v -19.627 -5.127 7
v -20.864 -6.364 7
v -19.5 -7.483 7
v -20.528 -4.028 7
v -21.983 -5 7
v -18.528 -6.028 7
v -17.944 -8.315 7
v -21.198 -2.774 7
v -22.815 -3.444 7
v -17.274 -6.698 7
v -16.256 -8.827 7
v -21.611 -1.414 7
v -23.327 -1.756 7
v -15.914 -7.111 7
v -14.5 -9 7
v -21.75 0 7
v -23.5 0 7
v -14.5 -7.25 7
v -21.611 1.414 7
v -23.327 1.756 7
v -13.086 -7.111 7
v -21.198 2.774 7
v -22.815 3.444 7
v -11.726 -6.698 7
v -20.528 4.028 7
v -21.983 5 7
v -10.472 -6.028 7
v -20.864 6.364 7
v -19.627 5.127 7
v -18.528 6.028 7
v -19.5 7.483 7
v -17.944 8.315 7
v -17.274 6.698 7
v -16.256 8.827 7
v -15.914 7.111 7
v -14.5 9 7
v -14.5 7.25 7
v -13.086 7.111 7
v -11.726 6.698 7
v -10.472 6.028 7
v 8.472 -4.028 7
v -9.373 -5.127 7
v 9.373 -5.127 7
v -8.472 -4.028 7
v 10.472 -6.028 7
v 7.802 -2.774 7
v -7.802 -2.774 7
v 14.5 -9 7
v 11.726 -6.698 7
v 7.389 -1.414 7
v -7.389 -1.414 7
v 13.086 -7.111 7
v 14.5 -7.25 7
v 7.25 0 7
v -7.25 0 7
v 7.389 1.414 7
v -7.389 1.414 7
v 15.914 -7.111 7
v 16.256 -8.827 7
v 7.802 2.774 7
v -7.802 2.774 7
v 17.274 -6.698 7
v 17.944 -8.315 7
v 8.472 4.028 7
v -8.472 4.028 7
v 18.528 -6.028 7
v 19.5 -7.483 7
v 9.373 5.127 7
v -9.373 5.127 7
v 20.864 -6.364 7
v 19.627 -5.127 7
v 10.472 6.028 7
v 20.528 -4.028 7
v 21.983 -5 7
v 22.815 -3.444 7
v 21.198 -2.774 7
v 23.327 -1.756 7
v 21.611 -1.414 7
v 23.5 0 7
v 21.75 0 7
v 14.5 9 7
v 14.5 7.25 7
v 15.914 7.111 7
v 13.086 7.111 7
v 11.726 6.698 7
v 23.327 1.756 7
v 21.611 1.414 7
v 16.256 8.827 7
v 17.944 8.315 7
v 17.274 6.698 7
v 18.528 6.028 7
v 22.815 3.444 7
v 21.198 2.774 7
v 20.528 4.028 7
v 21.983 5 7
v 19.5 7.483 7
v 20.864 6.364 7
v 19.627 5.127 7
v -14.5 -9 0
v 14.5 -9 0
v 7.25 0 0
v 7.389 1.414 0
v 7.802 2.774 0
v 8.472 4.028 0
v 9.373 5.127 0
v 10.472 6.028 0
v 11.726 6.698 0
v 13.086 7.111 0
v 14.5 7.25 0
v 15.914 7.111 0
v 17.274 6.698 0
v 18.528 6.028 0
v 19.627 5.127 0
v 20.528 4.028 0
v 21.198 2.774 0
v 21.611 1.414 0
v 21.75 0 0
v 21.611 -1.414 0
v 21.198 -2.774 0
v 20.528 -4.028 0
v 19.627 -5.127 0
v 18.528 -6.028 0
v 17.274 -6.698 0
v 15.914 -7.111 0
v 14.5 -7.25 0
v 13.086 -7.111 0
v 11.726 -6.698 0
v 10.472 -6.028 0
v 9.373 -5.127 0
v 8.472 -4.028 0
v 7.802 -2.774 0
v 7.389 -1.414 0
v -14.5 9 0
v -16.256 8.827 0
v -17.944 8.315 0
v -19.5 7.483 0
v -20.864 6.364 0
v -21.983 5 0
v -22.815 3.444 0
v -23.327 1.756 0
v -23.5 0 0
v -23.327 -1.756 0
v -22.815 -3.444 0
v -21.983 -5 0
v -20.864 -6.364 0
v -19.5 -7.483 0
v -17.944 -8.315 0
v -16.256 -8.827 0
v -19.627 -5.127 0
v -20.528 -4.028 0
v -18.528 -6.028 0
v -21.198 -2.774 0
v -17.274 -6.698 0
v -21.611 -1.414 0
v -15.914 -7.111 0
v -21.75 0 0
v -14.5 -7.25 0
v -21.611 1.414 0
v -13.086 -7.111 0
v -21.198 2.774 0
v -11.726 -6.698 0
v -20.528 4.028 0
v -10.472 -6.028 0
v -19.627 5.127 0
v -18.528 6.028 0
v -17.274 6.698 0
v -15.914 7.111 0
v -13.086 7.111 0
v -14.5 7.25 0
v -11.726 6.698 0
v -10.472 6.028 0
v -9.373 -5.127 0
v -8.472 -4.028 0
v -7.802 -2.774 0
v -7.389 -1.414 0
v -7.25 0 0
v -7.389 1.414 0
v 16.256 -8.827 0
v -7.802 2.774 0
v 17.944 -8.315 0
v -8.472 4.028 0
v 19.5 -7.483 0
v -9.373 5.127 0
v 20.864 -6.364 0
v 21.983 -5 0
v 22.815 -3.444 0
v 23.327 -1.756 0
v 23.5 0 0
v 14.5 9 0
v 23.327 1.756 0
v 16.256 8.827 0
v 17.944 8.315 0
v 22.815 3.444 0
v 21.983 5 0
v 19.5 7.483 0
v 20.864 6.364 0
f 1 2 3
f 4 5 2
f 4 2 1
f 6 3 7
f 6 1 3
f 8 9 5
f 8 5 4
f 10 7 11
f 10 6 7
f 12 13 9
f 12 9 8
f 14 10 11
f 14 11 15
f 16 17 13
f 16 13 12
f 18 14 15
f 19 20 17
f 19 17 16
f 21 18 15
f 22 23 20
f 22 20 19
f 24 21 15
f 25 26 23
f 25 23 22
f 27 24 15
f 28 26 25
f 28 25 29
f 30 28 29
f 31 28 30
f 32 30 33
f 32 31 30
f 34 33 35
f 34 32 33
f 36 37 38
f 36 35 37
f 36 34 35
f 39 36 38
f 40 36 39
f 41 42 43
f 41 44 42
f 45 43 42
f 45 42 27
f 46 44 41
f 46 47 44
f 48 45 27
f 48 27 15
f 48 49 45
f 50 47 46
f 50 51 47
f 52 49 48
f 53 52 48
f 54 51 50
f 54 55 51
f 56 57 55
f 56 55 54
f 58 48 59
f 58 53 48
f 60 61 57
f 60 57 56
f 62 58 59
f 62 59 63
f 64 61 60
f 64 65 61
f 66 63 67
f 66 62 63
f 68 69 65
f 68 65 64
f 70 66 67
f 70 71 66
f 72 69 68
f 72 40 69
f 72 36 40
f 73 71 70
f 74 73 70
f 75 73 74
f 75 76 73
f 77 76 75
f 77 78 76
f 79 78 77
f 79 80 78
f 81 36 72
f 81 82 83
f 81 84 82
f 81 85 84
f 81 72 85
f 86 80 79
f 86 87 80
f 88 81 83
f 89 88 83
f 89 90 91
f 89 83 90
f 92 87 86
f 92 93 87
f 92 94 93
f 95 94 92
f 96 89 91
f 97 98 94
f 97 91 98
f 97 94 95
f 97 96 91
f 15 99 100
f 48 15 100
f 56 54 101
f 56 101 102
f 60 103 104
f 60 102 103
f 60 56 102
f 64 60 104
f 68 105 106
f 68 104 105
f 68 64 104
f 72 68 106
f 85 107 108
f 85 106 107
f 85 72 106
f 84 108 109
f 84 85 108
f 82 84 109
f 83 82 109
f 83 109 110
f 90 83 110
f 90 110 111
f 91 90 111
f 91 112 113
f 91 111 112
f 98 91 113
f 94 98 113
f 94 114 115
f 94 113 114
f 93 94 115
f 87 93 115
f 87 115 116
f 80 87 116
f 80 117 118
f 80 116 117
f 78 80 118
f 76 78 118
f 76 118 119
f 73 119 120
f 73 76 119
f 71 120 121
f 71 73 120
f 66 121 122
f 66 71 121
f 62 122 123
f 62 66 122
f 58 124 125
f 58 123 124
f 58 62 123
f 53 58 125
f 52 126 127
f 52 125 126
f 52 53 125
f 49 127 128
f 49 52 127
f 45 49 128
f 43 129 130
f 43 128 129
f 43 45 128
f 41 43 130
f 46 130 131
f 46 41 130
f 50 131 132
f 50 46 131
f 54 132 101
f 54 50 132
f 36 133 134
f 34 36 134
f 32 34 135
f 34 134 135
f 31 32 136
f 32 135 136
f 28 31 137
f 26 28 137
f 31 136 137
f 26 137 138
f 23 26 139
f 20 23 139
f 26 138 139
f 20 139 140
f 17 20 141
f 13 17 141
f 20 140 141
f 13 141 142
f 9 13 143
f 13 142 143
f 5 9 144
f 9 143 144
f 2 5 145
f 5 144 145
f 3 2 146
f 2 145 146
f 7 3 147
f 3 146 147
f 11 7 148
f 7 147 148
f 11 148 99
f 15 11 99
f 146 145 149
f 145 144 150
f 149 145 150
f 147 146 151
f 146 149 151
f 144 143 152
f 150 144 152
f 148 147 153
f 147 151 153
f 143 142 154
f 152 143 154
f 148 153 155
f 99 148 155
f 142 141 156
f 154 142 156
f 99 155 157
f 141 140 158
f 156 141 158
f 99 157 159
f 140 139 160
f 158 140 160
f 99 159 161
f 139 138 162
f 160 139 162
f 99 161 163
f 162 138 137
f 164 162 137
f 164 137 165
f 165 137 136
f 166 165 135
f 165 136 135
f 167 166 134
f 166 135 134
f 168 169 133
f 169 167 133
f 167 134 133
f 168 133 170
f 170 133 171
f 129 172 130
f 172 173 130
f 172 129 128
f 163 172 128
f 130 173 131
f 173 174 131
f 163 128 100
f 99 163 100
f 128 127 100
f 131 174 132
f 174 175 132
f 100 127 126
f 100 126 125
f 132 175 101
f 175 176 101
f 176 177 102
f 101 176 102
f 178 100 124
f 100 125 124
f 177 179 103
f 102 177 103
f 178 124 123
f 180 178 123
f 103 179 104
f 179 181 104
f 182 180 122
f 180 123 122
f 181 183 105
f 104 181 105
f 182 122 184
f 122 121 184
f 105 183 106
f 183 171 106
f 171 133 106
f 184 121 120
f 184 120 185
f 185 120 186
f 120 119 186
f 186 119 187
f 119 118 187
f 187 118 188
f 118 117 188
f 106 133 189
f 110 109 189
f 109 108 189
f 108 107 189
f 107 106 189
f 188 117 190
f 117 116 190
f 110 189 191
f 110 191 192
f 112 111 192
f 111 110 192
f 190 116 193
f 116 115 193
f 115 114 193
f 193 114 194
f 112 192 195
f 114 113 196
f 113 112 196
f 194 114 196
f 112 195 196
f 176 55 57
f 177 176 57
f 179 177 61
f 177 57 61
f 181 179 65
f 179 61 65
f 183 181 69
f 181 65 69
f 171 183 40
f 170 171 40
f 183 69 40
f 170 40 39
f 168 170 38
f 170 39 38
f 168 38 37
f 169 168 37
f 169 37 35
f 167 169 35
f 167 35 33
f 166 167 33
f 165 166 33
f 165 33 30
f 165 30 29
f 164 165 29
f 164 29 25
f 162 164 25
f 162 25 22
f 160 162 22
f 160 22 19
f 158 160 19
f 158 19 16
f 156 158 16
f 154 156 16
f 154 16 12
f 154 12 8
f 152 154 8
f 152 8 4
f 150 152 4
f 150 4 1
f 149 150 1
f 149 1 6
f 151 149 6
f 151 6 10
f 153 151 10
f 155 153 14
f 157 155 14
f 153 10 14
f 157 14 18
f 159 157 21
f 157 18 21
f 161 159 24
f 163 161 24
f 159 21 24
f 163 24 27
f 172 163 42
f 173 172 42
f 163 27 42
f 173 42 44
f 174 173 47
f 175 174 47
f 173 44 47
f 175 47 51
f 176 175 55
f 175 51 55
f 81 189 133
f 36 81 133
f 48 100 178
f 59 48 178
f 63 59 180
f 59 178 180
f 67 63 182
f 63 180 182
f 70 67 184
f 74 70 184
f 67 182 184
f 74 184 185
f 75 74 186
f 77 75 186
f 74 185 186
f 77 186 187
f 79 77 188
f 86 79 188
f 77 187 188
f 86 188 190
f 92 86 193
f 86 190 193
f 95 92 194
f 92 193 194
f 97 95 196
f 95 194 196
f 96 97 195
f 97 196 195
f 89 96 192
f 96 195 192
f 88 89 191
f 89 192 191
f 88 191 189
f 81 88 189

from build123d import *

# Parameters (mm, degrees)
EXTRUDE_1_DEPTH = 7
M16X1_51_D      = 14.5


with BuildPart() as part:
    # Эскиз1 → Бобышка-Вытянуть1 (new body)
    with BuildSketch(Plane.XY):
        with BuildLine():
            Line((14.5, 9), (-14.5, 9))
            ThreePointArc((-14.5, 9), (-23.5, 0), (-14.5, -9))
            Line((-14.5, -9), (14.5, -9))
            ThreePointArc((14.5, -9), (23.5, 0), (14.5, 9))
        make_face()
    extrude(amount=EXTRUDE_1_DEPTH)

    # Отверстие обработанное метчиком M16x1.51 (through all)
    with Locations(Plane(origin=(0, 0, 0), x_dir=(-1, 0, 0), z_dir=(0, 0, -1))):
        with Locations((14.5, 0)):
            m16x1_51 = Hole(M16X1_51_D / 2)

    # Зеркальное отражение1: Отверстие обработанное метчиком M16x1.51 across plane
    add(m16x1_51.mirror(Plane(origin=(0, 0, 0), x_dir=(0, 0, 1), z_dir=(1, 0, 0))), mode=Mode.SUBTRACT)


solid = part.part
